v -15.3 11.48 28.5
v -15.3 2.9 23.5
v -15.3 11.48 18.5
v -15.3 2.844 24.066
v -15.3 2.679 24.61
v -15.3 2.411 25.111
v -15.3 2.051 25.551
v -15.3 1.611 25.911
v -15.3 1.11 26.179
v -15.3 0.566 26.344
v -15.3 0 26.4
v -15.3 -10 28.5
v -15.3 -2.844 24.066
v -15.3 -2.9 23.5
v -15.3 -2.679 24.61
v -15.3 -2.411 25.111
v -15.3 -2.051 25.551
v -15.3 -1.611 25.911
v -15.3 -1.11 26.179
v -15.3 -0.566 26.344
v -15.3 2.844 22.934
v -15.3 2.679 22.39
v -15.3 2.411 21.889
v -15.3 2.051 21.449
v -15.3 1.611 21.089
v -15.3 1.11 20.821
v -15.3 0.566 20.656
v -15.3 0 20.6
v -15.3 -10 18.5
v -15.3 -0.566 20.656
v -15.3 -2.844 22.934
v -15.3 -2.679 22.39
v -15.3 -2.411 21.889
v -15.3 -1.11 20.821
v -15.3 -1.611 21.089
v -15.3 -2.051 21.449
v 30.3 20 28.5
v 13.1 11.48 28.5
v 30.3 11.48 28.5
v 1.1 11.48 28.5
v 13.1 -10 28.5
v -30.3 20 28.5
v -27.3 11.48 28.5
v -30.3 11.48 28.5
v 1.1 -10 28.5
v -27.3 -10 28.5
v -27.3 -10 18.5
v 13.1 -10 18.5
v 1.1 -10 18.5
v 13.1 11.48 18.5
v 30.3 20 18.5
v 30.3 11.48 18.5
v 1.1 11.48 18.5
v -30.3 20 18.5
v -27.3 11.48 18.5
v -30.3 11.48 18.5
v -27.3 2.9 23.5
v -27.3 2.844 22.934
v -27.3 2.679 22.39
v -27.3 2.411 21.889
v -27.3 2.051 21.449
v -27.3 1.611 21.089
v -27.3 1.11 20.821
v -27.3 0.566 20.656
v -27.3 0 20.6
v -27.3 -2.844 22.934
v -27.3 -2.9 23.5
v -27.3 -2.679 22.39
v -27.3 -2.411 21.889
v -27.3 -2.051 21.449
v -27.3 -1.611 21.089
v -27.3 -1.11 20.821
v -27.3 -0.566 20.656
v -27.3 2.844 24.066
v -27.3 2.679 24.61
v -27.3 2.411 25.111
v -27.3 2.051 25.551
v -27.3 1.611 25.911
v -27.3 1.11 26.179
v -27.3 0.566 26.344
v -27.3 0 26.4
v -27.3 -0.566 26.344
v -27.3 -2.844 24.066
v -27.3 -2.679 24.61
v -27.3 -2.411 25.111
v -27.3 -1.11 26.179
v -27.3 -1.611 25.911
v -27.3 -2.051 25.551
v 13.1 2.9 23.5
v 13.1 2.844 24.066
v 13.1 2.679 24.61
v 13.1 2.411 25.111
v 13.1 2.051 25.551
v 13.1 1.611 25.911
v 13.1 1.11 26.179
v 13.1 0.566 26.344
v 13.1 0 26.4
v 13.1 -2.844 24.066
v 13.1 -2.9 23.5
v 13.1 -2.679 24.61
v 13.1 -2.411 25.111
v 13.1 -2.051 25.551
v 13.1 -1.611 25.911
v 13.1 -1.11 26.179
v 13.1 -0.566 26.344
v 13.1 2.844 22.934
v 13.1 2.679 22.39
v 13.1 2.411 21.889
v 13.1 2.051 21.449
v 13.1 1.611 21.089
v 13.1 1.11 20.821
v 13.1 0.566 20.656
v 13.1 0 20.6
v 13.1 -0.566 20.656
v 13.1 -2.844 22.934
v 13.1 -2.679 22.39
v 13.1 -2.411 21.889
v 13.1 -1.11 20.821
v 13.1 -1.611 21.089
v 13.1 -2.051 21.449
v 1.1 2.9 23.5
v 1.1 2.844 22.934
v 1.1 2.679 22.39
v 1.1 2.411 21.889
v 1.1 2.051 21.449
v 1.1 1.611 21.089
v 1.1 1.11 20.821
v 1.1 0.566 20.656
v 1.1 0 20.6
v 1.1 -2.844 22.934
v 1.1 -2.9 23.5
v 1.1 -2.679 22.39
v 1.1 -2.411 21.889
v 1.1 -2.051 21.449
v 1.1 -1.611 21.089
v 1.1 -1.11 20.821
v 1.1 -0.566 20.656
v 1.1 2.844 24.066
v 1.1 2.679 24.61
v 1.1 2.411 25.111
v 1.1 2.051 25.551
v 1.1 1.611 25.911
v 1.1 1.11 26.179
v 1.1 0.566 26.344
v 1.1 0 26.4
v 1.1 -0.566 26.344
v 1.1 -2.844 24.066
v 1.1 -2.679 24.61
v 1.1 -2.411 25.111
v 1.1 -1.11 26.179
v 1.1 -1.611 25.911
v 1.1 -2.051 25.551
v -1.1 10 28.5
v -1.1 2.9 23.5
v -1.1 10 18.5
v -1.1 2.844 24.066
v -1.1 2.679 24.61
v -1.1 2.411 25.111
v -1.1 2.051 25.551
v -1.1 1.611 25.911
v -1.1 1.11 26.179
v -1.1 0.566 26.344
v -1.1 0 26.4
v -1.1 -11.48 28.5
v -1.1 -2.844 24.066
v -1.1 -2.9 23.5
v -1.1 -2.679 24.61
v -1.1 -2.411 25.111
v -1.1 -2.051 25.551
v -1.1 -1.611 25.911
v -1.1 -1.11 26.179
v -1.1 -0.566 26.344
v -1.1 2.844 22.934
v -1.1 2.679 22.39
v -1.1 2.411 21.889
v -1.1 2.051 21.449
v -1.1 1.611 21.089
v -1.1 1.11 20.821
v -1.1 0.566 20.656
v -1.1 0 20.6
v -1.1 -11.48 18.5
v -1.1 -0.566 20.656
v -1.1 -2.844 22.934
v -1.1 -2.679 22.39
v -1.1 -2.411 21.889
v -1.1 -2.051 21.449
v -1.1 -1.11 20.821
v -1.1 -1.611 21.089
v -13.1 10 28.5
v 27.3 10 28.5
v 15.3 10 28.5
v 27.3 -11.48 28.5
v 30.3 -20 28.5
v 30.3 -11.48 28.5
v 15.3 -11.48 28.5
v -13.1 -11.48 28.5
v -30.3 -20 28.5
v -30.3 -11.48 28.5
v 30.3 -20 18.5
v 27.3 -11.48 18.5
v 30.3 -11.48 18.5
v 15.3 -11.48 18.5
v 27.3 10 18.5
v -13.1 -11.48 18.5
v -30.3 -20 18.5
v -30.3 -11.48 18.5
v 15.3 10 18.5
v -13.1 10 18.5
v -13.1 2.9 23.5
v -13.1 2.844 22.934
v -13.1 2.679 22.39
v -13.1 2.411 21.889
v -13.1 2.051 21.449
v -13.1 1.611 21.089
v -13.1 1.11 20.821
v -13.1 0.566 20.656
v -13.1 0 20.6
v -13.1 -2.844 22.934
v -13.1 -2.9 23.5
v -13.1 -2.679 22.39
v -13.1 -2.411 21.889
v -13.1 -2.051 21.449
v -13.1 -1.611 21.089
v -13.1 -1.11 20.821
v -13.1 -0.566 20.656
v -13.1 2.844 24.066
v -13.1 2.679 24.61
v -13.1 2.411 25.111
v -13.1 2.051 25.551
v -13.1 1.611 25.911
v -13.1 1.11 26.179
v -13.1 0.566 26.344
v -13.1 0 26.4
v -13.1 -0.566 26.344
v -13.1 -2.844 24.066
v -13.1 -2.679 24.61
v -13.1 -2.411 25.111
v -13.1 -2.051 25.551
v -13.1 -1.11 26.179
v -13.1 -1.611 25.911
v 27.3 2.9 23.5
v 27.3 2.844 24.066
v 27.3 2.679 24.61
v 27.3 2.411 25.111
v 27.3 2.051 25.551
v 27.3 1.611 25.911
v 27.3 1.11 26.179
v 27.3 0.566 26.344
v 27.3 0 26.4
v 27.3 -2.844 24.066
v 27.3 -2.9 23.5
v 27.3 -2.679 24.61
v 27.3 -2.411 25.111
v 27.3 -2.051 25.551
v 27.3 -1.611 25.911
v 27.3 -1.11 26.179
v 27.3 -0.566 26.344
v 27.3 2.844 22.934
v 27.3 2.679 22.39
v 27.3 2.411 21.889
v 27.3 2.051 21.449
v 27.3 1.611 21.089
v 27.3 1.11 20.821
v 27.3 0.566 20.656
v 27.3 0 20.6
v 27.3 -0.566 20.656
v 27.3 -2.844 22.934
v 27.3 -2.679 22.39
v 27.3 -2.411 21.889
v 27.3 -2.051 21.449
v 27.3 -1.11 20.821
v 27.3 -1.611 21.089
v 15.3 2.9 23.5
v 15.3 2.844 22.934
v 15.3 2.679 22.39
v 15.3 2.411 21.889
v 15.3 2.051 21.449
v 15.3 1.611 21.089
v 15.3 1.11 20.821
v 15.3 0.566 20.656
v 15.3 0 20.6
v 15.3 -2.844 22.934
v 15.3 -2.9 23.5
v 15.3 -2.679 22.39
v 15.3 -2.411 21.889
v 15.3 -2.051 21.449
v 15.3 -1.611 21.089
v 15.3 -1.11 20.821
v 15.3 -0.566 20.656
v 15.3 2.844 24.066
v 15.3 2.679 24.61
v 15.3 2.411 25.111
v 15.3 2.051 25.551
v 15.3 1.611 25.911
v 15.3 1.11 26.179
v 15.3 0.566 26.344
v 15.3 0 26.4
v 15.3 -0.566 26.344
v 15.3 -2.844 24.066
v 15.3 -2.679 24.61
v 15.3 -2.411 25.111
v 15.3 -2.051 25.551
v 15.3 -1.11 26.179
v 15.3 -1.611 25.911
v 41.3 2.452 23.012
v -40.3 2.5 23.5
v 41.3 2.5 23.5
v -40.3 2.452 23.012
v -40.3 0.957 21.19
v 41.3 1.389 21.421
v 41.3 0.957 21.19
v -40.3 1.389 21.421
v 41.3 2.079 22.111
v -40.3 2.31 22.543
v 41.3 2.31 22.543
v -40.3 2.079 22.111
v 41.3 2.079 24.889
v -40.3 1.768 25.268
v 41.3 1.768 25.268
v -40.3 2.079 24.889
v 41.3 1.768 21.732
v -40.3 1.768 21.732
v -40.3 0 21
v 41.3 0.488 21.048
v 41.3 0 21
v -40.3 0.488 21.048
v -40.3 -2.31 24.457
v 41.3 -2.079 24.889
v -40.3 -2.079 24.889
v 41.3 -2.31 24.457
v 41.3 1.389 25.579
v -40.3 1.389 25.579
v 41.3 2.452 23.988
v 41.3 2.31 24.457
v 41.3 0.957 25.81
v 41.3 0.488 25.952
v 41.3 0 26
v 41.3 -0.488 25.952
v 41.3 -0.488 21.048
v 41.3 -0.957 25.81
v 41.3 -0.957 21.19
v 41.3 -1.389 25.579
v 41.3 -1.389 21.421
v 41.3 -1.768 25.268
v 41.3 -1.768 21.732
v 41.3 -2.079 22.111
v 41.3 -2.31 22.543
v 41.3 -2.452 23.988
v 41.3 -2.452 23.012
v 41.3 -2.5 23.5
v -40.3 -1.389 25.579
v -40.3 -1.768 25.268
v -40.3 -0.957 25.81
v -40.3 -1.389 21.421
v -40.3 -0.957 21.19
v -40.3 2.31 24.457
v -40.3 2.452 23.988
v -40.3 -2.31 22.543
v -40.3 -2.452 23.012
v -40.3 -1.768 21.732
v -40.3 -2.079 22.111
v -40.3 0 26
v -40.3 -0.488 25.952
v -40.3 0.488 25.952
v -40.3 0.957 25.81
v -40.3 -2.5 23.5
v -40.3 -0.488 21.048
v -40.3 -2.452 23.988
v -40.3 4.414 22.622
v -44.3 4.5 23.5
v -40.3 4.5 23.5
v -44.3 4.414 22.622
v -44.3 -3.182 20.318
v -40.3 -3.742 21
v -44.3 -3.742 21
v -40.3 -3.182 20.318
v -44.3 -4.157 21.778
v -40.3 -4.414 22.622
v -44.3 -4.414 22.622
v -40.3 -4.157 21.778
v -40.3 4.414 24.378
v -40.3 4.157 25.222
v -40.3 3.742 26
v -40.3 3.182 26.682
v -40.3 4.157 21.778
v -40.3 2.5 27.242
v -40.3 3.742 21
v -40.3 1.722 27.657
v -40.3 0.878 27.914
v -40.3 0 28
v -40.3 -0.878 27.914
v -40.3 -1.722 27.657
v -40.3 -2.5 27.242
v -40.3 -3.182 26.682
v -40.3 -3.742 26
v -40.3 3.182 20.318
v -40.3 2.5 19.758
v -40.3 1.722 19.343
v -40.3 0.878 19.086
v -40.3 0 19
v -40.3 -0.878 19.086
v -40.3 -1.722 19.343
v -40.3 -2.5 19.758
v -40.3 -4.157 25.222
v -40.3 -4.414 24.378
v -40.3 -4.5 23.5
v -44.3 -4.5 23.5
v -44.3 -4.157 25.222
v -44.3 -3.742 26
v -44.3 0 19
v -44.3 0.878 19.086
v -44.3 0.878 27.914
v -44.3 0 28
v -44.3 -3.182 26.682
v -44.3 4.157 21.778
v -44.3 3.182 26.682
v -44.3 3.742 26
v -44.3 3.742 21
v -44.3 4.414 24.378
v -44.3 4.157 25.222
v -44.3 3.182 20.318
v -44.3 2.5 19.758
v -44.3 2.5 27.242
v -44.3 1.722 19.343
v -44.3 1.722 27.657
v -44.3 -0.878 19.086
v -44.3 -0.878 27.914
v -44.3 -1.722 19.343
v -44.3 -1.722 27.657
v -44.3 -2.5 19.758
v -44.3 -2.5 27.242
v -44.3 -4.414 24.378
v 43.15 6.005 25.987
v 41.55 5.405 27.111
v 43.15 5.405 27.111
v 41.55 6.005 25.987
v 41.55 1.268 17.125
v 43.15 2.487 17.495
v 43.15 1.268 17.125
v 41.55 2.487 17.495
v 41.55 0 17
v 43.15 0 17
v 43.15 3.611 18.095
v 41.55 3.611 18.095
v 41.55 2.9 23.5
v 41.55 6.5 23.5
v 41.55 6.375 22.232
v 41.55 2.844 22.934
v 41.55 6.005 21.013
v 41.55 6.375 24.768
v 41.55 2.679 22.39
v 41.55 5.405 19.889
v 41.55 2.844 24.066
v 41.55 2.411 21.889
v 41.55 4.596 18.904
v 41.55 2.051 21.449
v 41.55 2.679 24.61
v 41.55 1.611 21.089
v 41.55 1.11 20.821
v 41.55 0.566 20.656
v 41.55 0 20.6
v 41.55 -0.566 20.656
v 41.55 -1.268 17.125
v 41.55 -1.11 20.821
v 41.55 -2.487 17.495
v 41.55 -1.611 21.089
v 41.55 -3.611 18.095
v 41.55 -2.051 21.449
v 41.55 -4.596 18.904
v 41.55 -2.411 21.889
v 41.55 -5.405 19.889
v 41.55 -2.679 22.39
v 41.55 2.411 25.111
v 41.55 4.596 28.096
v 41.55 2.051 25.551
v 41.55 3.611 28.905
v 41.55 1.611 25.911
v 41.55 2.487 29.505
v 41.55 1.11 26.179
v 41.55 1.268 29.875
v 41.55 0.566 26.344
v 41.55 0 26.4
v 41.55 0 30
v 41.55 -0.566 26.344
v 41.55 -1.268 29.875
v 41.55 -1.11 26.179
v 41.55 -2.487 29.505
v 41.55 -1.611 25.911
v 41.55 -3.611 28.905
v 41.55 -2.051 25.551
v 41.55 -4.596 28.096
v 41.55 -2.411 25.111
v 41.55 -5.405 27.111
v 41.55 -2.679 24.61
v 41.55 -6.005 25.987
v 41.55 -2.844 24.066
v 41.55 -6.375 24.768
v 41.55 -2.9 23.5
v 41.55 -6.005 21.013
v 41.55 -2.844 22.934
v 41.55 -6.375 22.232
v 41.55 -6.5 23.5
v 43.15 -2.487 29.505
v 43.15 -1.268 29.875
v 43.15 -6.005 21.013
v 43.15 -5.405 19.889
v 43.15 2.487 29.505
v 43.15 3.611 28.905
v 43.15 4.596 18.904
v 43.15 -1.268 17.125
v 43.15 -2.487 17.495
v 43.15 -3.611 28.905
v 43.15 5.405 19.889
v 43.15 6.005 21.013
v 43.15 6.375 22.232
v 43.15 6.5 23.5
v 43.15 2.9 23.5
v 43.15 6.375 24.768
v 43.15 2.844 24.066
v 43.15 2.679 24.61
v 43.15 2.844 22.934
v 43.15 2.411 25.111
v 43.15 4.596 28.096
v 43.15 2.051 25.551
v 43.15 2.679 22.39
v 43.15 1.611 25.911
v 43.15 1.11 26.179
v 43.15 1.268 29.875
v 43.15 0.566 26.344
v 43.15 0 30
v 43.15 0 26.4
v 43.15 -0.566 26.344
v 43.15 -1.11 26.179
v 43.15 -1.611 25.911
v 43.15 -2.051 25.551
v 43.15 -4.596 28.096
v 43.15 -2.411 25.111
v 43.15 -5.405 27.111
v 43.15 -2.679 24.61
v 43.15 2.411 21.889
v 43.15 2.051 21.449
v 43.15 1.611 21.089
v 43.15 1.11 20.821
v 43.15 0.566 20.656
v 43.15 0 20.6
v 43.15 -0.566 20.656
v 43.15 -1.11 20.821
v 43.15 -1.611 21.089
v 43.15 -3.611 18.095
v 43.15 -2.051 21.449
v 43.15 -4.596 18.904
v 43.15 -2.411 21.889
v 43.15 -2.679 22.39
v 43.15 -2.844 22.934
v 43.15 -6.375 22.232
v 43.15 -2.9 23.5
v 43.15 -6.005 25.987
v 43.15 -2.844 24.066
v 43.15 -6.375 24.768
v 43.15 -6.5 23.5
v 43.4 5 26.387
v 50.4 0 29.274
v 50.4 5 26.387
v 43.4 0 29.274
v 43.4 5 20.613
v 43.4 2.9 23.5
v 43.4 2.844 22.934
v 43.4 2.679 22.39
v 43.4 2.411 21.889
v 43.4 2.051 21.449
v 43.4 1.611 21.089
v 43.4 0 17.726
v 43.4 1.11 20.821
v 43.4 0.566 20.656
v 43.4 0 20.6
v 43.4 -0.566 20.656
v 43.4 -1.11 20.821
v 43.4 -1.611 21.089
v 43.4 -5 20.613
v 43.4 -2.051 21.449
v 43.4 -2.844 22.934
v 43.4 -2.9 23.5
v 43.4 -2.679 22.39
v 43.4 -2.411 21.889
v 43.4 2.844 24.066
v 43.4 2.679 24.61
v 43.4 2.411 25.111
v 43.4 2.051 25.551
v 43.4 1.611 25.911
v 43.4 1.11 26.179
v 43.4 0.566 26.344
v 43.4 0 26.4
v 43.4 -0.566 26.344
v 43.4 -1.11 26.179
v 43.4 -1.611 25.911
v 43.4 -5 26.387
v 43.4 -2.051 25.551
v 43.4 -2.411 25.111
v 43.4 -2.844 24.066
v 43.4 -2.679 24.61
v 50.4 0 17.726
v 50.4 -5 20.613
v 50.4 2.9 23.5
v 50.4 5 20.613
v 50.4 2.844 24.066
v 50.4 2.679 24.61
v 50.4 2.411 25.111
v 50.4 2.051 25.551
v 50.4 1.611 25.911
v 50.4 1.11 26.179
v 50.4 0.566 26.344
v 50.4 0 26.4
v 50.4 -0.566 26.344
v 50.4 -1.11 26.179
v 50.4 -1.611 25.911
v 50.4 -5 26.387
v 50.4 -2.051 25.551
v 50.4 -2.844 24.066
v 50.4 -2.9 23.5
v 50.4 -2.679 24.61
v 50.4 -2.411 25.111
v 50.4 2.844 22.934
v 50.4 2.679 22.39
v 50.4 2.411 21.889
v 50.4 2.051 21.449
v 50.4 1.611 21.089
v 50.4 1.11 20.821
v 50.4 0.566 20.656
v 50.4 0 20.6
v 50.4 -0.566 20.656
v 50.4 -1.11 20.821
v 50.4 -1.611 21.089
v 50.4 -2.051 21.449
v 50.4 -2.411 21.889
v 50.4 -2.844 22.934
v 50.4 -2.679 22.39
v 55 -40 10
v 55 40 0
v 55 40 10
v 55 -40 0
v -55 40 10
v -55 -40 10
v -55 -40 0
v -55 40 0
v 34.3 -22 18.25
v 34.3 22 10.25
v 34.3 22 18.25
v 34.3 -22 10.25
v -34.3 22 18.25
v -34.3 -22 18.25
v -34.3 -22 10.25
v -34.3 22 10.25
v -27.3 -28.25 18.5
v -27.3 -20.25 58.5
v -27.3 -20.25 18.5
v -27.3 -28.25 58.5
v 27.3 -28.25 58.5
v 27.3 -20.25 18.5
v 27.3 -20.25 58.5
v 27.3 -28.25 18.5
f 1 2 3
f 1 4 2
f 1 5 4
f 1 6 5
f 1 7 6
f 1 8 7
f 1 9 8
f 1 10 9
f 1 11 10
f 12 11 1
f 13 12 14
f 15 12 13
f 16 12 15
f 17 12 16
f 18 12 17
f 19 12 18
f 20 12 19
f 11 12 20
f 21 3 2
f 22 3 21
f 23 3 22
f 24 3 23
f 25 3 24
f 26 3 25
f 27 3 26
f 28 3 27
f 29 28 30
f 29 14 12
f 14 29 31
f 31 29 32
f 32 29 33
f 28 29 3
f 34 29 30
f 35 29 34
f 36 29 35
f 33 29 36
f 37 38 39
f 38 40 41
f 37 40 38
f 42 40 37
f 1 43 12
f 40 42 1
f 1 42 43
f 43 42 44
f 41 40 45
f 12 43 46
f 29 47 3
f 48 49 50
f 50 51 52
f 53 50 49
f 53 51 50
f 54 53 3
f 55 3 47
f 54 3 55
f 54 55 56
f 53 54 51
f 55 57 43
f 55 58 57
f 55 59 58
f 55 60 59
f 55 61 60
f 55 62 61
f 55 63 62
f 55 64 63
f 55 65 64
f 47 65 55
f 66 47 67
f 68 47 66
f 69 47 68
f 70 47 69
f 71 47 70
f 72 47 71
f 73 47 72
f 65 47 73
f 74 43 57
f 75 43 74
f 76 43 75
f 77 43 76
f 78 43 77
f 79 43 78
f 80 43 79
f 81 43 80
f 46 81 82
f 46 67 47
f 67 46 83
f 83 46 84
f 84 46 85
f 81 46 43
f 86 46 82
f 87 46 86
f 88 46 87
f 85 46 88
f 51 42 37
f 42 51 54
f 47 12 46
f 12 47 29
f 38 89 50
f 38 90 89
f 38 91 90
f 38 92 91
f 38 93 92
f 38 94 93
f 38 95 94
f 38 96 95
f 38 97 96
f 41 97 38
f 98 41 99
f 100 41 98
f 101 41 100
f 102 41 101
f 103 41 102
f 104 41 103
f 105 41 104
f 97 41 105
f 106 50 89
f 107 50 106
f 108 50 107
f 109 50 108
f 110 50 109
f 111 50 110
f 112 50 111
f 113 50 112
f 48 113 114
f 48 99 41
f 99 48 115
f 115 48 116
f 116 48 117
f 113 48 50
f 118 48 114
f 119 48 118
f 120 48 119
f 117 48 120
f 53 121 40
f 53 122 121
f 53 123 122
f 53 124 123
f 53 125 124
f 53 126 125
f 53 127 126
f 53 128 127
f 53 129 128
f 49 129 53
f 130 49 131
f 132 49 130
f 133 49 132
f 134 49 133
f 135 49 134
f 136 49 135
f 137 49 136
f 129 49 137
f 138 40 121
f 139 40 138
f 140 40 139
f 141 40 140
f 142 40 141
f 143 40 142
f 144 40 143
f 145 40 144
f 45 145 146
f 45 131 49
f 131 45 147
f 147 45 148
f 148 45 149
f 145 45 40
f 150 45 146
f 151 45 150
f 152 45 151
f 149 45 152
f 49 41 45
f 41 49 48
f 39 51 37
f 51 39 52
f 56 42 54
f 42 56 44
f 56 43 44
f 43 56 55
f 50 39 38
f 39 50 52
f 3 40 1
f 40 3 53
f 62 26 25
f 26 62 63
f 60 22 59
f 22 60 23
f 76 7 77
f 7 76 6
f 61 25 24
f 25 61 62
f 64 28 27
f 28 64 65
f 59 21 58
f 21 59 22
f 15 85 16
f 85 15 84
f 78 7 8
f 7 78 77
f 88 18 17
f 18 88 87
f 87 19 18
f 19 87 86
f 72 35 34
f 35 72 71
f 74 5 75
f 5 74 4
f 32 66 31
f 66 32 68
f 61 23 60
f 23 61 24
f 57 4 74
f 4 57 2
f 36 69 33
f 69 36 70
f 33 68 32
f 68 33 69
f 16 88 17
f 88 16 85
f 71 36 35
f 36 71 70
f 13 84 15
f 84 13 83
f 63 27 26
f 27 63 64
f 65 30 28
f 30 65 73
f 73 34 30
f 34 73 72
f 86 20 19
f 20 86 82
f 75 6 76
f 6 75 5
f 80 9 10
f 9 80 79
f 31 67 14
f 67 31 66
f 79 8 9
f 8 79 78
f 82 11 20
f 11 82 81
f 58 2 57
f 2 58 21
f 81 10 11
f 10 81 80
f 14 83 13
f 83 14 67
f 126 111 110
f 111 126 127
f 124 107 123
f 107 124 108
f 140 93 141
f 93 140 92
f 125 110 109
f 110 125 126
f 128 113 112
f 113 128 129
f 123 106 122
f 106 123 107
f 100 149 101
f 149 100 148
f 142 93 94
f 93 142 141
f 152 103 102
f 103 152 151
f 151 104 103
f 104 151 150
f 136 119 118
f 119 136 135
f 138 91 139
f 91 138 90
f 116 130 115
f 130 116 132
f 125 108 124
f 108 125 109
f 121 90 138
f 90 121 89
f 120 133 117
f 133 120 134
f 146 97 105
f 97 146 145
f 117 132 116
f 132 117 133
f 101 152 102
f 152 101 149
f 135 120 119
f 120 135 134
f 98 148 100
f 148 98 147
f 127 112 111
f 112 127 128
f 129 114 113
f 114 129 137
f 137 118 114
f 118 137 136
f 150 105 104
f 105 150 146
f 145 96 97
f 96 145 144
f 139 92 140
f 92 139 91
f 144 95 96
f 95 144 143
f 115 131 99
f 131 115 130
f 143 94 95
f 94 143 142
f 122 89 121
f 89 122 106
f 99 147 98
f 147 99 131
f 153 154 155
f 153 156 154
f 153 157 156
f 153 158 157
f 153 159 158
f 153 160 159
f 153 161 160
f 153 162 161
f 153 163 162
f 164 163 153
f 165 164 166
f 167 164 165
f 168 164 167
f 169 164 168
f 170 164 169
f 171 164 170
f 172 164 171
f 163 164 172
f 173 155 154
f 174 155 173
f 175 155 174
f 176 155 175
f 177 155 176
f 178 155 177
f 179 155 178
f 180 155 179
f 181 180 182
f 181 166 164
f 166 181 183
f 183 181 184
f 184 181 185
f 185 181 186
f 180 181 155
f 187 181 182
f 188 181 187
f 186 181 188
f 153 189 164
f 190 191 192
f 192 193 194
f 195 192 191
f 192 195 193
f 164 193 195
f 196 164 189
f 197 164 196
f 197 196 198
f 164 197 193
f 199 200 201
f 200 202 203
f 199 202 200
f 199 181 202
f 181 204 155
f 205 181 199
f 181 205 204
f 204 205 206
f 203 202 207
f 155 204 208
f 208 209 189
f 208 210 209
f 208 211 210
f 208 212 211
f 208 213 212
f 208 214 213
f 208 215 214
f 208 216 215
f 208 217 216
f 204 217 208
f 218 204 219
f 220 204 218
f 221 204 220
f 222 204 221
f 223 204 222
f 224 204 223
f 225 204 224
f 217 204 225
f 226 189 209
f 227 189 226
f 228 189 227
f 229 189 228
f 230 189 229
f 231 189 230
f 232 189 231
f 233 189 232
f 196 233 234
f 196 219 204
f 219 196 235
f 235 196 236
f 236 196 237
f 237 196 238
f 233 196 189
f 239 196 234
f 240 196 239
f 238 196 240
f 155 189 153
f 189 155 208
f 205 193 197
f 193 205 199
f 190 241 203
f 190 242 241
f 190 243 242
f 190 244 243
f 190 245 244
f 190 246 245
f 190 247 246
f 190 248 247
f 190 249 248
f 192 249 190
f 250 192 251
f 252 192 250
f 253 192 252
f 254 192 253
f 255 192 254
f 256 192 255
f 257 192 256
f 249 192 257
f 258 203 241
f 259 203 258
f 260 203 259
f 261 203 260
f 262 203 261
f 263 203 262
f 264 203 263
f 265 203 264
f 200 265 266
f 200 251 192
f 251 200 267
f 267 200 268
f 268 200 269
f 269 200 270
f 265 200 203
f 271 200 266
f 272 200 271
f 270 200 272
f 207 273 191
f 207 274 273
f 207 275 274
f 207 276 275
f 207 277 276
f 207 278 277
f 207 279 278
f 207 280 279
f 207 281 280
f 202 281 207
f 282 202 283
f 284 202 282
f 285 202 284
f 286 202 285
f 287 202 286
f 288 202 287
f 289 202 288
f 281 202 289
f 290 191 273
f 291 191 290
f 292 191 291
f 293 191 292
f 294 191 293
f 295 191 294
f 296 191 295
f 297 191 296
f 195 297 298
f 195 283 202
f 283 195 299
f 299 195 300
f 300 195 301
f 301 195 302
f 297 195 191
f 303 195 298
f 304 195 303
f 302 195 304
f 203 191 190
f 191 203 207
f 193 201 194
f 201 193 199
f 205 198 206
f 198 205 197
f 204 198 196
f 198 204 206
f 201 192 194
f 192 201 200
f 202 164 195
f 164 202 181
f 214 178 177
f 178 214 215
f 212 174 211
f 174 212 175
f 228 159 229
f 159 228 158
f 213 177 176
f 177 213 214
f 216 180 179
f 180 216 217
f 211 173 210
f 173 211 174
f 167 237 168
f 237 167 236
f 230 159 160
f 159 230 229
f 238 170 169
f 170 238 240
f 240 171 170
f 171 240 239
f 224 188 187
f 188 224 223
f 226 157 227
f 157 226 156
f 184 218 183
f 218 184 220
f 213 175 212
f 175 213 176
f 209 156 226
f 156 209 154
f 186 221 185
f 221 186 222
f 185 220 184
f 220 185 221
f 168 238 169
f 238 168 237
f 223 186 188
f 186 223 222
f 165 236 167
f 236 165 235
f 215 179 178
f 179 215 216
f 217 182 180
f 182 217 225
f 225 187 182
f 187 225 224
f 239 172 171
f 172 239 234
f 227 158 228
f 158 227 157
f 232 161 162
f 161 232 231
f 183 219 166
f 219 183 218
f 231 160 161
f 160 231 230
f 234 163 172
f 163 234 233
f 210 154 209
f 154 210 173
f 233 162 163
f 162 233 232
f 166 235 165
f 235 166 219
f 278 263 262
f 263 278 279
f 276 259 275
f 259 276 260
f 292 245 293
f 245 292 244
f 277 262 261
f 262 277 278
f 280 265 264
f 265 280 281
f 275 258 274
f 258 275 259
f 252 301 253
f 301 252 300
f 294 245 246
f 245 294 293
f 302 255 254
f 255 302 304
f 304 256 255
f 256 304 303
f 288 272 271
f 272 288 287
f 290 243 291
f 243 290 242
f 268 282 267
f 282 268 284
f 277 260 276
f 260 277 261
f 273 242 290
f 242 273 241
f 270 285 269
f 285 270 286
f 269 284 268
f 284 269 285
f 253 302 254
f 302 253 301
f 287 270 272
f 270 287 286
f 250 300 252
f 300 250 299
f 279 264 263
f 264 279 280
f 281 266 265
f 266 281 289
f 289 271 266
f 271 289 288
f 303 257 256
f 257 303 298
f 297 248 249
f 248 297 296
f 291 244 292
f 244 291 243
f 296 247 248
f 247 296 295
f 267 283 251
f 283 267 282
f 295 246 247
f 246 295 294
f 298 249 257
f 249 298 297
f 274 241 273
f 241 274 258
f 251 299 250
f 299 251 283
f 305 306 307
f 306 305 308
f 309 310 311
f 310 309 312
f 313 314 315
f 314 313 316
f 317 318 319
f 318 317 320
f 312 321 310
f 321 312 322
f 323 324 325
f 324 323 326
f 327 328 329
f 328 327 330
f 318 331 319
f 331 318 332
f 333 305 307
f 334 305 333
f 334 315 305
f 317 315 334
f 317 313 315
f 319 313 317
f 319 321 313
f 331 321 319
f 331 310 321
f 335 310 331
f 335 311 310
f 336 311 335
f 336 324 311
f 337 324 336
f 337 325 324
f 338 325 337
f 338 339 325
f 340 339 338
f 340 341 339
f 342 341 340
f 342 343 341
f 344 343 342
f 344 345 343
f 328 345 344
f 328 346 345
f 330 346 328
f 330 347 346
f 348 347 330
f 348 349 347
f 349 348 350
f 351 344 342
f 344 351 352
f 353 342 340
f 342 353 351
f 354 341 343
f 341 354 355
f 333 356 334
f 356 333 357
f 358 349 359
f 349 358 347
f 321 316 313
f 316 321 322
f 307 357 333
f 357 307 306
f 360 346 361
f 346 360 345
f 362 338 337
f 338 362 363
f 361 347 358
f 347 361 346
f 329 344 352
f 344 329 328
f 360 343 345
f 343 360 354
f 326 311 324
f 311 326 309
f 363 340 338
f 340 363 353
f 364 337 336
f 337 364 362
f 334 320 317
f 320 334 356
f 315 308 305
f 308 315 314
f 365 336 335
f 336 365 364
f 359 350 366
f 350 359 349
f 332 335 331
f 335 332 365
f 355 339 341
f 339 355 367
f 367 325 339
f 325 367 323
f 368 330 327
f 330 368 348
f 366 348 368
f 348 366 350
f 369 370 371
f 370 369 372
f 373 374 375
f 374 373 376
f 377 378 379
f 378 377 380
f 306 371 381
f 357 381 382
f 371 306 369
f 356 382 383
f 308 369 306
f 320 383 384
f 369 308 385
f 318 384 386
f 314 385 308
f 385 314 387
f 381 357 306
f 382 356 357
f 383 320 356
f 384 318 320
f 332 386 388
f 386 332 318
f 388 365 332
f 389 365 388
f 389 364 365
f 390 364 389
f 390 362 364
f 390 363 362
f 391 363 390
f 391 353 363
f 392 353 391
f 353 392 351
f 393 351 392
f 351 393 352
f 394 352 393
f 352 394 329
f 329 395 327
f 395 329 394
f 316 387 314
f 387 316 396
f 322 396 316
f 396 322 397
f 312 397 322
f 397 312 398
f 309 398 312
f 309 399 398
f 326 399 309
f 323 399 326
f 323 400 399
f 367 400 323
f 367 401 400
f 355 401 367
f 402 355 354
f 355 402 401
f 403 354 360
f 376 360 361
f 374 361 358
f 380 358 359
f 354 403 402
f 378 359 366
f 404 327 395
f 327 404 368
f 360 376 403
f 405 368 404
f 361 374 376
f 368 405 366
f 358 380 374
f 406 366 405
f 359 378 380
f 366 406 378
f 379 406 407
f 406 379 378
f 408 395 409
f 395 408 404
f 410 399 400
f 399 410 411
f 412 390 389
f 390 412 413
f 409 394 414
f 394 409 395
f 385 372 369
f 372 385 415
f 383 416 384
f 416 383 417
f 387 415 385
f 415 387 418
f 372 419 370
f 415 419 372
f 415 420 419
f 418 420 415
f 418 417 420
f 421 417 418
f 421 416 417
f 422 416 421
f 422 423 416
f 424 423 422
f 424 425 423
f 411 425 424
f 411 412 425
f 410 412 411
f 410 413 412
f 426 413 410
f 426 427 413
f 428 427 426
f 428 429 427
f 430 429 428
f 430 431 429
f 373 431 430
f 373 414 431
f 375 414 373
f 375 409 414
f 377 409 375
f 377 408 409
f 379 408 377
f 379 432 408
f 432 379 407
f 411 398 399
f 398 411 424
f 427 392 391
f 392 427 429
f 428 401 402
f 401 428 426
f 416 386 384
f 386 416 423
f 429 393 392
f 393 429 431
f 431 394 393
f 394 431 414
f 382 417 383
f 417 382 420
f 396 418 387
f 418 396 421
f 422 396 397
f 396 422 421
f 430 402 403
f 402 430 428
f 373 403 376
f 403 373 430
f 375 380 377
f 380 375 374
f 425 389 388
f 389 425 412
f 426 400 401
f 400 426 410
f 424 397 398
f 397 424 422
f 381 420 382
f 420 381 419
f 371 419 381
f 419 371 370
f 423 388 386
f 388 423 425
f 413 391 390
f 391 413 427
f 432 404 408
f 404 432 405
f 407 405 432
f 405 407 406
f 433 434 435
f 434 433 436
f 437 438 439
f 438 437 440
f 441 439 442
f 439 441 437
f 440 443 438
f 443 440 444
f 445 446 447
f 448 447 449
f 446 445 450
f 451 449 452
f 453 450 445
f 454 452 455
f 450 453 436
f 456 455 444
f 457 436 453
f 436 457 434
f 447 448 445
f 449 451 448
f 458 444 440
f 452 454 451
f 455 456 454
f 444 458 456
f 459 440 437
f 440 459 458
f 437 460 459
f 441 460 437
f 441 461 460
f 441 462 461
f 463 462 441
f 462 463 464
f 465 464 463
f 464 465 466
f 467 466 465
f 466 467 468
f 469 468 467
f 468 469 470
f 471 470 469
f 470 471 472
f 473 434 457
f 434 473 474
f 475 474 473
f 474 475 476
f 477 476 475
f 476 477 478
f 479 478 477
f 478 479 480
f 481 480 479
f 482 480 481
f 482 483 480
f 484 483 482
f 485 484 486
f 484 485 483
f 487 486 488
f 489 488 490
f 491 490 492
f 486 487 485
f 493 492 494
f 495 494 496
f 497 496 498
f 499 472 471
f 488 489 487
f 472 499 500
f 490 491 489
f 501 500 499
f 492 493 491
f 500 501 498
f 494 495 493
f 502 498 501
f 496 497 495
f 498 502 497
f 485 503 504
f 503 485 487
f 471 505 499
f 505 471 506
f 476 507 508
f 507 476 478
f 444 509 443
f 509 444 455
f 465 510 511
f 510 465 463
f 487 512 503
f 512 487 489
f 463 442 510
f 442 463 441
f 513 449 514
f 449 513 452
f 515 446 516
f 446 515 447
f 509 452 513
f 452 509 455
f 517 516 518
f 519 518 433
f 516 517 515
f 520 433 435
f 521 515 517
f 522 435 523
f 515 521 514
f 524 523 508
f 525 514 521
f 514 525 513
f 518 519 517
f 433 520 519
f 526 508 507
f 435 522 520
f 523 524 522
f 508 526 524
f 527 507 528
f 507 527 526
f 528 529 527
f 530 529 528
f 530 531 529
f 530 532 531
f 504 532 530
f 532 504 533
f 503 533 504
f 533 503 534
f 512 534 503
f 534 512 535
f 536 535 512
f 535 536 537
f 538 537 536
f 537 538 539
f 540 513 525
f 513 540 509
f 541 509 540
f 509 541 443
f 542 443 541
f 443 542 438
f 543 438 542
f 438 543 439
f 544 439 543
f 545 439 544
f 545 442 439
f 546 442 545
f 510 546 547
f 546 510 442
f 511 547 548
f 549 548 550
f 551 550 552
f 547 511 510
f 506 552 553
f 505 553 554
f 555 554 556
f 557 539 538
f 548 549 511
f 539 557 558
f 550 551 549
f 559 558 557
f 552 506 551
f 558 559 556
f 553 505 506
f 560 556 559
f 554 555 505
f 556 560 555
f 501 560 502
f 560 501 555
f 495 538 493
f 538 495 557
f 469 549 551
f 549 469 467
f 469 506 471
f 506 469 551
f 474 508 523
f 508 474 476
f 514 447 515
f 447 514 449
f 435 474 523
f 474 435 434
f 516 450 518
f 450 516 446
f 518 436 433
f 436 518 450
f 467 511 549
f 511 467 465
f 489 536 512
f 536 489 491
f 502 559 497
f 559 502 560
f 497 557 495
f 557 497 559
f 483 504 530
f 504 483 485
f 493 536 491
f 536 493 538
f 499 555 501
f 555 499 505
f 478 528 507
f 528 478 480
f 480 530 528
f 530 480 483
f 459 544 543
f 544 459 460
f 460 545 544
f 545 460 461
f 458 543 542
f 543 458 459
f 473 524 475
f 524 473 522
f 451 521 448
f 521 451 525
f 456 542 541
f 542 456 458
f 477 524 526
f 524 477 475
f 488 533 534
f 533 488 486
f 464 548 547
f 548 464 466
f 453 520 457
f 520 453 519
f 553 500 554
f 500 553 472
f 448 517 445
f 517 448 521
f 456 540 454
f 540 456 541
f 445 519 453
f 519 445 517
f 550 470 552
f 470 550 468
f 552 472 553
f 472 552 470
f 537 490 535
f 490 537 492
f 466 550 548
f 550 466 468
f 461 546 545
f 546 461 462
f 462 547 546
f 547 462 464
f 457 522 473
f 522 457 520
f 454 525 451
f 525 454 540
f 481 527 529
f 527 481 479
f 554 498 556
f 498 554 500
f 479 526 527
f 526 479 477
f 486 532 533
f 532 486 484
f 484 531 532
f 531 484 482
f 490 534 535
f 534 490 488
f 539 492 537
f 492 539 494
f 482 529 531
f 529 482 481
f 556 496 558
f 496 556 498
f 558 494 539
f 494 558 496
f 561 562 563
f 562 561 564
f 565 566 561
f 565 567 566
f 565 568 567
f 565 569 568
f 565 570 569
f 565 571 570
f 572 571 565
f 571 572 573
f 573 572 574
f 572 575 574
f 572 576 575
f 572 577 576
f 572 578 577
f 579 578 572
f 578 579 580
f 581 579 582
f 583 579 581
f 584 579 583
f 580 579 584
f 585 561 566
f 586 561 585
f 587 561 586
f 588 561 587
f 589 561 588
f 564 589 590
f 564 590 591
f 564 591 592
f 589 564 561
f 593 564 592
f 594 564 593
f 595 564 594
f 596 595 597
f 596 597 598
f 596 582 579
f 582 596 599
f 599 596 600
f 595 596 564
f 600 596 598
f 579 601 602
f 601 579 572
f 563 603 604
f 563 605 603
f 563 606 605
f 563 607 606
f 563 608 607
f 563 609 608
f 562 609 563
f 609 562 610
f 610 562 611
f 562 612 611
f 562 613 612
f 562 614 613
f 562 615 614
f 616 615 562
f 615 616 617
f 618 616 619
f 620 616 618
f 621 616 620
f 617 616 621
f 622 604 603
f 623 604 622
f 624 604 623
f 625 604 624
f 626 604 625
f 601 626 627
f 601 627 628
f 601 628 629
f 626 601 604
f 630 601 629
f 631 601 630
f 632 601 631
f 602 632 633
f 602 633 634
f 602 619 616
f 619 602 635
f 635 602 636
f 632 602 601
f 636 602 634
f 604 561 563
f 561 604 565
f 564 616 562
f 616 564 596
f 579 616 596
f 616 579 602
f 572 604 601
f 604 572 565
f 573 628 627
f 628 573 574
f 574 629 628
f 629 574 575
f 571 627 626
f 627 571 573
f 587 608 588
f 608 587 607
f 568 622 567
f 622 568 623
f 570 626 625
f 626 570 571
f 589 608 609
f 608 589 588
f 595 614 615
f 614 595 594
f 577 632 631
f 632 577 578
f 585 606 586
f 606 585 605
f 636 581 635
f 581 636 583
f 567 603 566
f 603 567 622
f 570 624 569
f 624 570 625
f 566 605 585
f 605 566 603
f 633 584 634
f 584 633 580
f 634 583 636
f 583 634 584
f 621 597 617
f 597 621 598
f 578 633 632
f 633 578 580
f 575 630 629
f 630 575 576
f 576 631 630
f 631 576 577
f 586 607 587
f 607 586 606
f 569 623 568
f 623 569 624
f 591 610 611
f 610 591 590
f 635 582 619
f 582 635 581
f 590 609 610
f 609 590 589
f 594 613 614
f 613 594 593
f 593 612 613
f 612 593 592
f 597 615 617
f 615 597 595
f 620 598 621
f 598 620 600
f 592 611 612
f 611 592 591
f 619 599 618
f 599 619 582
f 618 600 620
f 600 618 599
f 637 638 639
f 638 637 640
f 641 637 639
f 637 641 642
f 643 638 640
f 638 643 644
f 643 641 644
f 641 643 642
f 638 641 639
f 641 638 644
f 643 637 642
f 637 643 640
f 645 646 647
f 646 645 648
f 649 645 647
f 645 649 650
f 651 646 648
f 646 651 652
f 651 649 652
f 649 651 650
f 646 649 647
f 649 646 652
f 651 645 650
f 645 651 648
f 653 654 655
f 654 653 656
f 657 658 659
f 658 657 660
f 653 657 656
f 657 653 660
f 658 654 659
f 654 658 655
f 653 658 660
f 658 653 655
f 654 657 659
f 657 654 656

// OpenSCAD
$fn = 32;

// ------------------------------------------------------------------------
// Comb hinge with flap: leaf 60.6 x 20 mm, pin d5, flap 40 mm
// Every part is its own module, assembly() places every instance.
// ------------------------------------------------------------------------

// --- part 1 ---
module hinge_bed() {
  difference() {
    translate([-55, -40, 0]) cube([110, 80, 10]);
  }
}

// --- part 2 ---
module hinge_riser() {
  difference() {
    translate([-34.3, -22, 0]) cube([68.6, 44, 8]);
  }
}

// --- part 3 ---
module hinge_leaf_a() {
  difference() {
    union() {
      translate([-27.3, -10, -5]) cube([12, 30, 10]);
      translate([1.1, -10, -5]) cube([12, 30, 10]);
      translate([-30.3, 11.48, -5]) cube([60.6, 8.52, 10]);
    }
    translate([-21.3, 0, 0]) rotate([0, 90, 0]) cylinder(h = 14, d = 5.8, center = true);
    translate([7.1, 0, 0]) rotate([0, 90, 0]) cylinder(h = 14, d = 5.8, center = true);
  }
}

// --- part 4 ---
module hinge_leaf_b() {
  difference() {
    union() {
      translate([-13.1, -20, -5]) cube([12, 30, 10]);
      translate([15.3, -20, -5]) cube([12, 30, 10]);
      translate([-30.3, -20, -5]) cube([60.6, 8.52, 10]);
    }
    translate([-7.1, 0, 0]) rotate([0, 90, 0]) cylinder(h = 14, d = 5.8, center = true);
    translate([21.3, 0, 0]) rotate([0, 90, 0]) cylinder(h = 14, d = 5.8, center = true);
  }
}

// --- part 5 ---
module hinge_flap() {
  difference() {
    translate([-27.3, -20, 0]) cube([54.6, 40, 8]);
  }
}

// --- part 6 ---
module hinge_pin() {
  rotate([0, 90, 0]) cylinder(h = 82.6, d = 5, center = true);
  translate([-44.3, 0, 0]) rotate([0, 90, 0]) cylinder(h = 4, d = 9);
}

// --- part 7 ---
module pin_washer() {
  difference() {
      translate([0, 0, 0]) cylinder(h = 1.6, d = 13);
      translate([0, 0, -1]) cylinder(h = 3.6, d = 5.8);
    }
}

// --- part 8 ---
module pin_nut() {
  difference() {
    linear_extrude(height = 7) polygon(points = [[5.774, 0], [2.887, 5], [-2.887, 5], [-5.774, 0], [-2.887, -5], [2.887, -5]]);
    translate([0, 0, -1]) cylinder(h = 9, d = 5.8);
  }
}

// --- assembly ---
module assembly() {
  color([0.80, 0.24, 0.20]) translate([0, 0, 0]) rotate([0, 0, 0]) hinge_bed();
  color([0.20, 0.45, 0.75]) translate([0, 0, 10.25]) rotate([0, 0, 0]) hinge_riser();
  color([0.25, 0.62, 0.32]) translate([0, 0, 23.5]) rotate([0, 0, 0]) hinge_leaf_a();
  color([0.92, 0.70, 0.18]) translate([0, 0, 23.5]) rotate([0, 0, 0]) hinge_leaf_b();
  color([0.58, 0.35, 0.70]) translate([0, -20.25, 38.5]) rotate([90, 0, 0]) hinge_flap();
  color([0.16, 0.66, 0.66]) translate([0, 0, 23.5]) rotate([0, 0, 0]) hinge_pin();
  color([0.85, 0.48, 0.18]) translate([41.55, 0, 23.5]) rotate([0, 90, 0]) pin_washer();
  color([0.55, 0.60, 0.65]) translate([43.4, 0, 23.5]) rotate([0, 90, 0]) pin_nut();
}

assembly();
